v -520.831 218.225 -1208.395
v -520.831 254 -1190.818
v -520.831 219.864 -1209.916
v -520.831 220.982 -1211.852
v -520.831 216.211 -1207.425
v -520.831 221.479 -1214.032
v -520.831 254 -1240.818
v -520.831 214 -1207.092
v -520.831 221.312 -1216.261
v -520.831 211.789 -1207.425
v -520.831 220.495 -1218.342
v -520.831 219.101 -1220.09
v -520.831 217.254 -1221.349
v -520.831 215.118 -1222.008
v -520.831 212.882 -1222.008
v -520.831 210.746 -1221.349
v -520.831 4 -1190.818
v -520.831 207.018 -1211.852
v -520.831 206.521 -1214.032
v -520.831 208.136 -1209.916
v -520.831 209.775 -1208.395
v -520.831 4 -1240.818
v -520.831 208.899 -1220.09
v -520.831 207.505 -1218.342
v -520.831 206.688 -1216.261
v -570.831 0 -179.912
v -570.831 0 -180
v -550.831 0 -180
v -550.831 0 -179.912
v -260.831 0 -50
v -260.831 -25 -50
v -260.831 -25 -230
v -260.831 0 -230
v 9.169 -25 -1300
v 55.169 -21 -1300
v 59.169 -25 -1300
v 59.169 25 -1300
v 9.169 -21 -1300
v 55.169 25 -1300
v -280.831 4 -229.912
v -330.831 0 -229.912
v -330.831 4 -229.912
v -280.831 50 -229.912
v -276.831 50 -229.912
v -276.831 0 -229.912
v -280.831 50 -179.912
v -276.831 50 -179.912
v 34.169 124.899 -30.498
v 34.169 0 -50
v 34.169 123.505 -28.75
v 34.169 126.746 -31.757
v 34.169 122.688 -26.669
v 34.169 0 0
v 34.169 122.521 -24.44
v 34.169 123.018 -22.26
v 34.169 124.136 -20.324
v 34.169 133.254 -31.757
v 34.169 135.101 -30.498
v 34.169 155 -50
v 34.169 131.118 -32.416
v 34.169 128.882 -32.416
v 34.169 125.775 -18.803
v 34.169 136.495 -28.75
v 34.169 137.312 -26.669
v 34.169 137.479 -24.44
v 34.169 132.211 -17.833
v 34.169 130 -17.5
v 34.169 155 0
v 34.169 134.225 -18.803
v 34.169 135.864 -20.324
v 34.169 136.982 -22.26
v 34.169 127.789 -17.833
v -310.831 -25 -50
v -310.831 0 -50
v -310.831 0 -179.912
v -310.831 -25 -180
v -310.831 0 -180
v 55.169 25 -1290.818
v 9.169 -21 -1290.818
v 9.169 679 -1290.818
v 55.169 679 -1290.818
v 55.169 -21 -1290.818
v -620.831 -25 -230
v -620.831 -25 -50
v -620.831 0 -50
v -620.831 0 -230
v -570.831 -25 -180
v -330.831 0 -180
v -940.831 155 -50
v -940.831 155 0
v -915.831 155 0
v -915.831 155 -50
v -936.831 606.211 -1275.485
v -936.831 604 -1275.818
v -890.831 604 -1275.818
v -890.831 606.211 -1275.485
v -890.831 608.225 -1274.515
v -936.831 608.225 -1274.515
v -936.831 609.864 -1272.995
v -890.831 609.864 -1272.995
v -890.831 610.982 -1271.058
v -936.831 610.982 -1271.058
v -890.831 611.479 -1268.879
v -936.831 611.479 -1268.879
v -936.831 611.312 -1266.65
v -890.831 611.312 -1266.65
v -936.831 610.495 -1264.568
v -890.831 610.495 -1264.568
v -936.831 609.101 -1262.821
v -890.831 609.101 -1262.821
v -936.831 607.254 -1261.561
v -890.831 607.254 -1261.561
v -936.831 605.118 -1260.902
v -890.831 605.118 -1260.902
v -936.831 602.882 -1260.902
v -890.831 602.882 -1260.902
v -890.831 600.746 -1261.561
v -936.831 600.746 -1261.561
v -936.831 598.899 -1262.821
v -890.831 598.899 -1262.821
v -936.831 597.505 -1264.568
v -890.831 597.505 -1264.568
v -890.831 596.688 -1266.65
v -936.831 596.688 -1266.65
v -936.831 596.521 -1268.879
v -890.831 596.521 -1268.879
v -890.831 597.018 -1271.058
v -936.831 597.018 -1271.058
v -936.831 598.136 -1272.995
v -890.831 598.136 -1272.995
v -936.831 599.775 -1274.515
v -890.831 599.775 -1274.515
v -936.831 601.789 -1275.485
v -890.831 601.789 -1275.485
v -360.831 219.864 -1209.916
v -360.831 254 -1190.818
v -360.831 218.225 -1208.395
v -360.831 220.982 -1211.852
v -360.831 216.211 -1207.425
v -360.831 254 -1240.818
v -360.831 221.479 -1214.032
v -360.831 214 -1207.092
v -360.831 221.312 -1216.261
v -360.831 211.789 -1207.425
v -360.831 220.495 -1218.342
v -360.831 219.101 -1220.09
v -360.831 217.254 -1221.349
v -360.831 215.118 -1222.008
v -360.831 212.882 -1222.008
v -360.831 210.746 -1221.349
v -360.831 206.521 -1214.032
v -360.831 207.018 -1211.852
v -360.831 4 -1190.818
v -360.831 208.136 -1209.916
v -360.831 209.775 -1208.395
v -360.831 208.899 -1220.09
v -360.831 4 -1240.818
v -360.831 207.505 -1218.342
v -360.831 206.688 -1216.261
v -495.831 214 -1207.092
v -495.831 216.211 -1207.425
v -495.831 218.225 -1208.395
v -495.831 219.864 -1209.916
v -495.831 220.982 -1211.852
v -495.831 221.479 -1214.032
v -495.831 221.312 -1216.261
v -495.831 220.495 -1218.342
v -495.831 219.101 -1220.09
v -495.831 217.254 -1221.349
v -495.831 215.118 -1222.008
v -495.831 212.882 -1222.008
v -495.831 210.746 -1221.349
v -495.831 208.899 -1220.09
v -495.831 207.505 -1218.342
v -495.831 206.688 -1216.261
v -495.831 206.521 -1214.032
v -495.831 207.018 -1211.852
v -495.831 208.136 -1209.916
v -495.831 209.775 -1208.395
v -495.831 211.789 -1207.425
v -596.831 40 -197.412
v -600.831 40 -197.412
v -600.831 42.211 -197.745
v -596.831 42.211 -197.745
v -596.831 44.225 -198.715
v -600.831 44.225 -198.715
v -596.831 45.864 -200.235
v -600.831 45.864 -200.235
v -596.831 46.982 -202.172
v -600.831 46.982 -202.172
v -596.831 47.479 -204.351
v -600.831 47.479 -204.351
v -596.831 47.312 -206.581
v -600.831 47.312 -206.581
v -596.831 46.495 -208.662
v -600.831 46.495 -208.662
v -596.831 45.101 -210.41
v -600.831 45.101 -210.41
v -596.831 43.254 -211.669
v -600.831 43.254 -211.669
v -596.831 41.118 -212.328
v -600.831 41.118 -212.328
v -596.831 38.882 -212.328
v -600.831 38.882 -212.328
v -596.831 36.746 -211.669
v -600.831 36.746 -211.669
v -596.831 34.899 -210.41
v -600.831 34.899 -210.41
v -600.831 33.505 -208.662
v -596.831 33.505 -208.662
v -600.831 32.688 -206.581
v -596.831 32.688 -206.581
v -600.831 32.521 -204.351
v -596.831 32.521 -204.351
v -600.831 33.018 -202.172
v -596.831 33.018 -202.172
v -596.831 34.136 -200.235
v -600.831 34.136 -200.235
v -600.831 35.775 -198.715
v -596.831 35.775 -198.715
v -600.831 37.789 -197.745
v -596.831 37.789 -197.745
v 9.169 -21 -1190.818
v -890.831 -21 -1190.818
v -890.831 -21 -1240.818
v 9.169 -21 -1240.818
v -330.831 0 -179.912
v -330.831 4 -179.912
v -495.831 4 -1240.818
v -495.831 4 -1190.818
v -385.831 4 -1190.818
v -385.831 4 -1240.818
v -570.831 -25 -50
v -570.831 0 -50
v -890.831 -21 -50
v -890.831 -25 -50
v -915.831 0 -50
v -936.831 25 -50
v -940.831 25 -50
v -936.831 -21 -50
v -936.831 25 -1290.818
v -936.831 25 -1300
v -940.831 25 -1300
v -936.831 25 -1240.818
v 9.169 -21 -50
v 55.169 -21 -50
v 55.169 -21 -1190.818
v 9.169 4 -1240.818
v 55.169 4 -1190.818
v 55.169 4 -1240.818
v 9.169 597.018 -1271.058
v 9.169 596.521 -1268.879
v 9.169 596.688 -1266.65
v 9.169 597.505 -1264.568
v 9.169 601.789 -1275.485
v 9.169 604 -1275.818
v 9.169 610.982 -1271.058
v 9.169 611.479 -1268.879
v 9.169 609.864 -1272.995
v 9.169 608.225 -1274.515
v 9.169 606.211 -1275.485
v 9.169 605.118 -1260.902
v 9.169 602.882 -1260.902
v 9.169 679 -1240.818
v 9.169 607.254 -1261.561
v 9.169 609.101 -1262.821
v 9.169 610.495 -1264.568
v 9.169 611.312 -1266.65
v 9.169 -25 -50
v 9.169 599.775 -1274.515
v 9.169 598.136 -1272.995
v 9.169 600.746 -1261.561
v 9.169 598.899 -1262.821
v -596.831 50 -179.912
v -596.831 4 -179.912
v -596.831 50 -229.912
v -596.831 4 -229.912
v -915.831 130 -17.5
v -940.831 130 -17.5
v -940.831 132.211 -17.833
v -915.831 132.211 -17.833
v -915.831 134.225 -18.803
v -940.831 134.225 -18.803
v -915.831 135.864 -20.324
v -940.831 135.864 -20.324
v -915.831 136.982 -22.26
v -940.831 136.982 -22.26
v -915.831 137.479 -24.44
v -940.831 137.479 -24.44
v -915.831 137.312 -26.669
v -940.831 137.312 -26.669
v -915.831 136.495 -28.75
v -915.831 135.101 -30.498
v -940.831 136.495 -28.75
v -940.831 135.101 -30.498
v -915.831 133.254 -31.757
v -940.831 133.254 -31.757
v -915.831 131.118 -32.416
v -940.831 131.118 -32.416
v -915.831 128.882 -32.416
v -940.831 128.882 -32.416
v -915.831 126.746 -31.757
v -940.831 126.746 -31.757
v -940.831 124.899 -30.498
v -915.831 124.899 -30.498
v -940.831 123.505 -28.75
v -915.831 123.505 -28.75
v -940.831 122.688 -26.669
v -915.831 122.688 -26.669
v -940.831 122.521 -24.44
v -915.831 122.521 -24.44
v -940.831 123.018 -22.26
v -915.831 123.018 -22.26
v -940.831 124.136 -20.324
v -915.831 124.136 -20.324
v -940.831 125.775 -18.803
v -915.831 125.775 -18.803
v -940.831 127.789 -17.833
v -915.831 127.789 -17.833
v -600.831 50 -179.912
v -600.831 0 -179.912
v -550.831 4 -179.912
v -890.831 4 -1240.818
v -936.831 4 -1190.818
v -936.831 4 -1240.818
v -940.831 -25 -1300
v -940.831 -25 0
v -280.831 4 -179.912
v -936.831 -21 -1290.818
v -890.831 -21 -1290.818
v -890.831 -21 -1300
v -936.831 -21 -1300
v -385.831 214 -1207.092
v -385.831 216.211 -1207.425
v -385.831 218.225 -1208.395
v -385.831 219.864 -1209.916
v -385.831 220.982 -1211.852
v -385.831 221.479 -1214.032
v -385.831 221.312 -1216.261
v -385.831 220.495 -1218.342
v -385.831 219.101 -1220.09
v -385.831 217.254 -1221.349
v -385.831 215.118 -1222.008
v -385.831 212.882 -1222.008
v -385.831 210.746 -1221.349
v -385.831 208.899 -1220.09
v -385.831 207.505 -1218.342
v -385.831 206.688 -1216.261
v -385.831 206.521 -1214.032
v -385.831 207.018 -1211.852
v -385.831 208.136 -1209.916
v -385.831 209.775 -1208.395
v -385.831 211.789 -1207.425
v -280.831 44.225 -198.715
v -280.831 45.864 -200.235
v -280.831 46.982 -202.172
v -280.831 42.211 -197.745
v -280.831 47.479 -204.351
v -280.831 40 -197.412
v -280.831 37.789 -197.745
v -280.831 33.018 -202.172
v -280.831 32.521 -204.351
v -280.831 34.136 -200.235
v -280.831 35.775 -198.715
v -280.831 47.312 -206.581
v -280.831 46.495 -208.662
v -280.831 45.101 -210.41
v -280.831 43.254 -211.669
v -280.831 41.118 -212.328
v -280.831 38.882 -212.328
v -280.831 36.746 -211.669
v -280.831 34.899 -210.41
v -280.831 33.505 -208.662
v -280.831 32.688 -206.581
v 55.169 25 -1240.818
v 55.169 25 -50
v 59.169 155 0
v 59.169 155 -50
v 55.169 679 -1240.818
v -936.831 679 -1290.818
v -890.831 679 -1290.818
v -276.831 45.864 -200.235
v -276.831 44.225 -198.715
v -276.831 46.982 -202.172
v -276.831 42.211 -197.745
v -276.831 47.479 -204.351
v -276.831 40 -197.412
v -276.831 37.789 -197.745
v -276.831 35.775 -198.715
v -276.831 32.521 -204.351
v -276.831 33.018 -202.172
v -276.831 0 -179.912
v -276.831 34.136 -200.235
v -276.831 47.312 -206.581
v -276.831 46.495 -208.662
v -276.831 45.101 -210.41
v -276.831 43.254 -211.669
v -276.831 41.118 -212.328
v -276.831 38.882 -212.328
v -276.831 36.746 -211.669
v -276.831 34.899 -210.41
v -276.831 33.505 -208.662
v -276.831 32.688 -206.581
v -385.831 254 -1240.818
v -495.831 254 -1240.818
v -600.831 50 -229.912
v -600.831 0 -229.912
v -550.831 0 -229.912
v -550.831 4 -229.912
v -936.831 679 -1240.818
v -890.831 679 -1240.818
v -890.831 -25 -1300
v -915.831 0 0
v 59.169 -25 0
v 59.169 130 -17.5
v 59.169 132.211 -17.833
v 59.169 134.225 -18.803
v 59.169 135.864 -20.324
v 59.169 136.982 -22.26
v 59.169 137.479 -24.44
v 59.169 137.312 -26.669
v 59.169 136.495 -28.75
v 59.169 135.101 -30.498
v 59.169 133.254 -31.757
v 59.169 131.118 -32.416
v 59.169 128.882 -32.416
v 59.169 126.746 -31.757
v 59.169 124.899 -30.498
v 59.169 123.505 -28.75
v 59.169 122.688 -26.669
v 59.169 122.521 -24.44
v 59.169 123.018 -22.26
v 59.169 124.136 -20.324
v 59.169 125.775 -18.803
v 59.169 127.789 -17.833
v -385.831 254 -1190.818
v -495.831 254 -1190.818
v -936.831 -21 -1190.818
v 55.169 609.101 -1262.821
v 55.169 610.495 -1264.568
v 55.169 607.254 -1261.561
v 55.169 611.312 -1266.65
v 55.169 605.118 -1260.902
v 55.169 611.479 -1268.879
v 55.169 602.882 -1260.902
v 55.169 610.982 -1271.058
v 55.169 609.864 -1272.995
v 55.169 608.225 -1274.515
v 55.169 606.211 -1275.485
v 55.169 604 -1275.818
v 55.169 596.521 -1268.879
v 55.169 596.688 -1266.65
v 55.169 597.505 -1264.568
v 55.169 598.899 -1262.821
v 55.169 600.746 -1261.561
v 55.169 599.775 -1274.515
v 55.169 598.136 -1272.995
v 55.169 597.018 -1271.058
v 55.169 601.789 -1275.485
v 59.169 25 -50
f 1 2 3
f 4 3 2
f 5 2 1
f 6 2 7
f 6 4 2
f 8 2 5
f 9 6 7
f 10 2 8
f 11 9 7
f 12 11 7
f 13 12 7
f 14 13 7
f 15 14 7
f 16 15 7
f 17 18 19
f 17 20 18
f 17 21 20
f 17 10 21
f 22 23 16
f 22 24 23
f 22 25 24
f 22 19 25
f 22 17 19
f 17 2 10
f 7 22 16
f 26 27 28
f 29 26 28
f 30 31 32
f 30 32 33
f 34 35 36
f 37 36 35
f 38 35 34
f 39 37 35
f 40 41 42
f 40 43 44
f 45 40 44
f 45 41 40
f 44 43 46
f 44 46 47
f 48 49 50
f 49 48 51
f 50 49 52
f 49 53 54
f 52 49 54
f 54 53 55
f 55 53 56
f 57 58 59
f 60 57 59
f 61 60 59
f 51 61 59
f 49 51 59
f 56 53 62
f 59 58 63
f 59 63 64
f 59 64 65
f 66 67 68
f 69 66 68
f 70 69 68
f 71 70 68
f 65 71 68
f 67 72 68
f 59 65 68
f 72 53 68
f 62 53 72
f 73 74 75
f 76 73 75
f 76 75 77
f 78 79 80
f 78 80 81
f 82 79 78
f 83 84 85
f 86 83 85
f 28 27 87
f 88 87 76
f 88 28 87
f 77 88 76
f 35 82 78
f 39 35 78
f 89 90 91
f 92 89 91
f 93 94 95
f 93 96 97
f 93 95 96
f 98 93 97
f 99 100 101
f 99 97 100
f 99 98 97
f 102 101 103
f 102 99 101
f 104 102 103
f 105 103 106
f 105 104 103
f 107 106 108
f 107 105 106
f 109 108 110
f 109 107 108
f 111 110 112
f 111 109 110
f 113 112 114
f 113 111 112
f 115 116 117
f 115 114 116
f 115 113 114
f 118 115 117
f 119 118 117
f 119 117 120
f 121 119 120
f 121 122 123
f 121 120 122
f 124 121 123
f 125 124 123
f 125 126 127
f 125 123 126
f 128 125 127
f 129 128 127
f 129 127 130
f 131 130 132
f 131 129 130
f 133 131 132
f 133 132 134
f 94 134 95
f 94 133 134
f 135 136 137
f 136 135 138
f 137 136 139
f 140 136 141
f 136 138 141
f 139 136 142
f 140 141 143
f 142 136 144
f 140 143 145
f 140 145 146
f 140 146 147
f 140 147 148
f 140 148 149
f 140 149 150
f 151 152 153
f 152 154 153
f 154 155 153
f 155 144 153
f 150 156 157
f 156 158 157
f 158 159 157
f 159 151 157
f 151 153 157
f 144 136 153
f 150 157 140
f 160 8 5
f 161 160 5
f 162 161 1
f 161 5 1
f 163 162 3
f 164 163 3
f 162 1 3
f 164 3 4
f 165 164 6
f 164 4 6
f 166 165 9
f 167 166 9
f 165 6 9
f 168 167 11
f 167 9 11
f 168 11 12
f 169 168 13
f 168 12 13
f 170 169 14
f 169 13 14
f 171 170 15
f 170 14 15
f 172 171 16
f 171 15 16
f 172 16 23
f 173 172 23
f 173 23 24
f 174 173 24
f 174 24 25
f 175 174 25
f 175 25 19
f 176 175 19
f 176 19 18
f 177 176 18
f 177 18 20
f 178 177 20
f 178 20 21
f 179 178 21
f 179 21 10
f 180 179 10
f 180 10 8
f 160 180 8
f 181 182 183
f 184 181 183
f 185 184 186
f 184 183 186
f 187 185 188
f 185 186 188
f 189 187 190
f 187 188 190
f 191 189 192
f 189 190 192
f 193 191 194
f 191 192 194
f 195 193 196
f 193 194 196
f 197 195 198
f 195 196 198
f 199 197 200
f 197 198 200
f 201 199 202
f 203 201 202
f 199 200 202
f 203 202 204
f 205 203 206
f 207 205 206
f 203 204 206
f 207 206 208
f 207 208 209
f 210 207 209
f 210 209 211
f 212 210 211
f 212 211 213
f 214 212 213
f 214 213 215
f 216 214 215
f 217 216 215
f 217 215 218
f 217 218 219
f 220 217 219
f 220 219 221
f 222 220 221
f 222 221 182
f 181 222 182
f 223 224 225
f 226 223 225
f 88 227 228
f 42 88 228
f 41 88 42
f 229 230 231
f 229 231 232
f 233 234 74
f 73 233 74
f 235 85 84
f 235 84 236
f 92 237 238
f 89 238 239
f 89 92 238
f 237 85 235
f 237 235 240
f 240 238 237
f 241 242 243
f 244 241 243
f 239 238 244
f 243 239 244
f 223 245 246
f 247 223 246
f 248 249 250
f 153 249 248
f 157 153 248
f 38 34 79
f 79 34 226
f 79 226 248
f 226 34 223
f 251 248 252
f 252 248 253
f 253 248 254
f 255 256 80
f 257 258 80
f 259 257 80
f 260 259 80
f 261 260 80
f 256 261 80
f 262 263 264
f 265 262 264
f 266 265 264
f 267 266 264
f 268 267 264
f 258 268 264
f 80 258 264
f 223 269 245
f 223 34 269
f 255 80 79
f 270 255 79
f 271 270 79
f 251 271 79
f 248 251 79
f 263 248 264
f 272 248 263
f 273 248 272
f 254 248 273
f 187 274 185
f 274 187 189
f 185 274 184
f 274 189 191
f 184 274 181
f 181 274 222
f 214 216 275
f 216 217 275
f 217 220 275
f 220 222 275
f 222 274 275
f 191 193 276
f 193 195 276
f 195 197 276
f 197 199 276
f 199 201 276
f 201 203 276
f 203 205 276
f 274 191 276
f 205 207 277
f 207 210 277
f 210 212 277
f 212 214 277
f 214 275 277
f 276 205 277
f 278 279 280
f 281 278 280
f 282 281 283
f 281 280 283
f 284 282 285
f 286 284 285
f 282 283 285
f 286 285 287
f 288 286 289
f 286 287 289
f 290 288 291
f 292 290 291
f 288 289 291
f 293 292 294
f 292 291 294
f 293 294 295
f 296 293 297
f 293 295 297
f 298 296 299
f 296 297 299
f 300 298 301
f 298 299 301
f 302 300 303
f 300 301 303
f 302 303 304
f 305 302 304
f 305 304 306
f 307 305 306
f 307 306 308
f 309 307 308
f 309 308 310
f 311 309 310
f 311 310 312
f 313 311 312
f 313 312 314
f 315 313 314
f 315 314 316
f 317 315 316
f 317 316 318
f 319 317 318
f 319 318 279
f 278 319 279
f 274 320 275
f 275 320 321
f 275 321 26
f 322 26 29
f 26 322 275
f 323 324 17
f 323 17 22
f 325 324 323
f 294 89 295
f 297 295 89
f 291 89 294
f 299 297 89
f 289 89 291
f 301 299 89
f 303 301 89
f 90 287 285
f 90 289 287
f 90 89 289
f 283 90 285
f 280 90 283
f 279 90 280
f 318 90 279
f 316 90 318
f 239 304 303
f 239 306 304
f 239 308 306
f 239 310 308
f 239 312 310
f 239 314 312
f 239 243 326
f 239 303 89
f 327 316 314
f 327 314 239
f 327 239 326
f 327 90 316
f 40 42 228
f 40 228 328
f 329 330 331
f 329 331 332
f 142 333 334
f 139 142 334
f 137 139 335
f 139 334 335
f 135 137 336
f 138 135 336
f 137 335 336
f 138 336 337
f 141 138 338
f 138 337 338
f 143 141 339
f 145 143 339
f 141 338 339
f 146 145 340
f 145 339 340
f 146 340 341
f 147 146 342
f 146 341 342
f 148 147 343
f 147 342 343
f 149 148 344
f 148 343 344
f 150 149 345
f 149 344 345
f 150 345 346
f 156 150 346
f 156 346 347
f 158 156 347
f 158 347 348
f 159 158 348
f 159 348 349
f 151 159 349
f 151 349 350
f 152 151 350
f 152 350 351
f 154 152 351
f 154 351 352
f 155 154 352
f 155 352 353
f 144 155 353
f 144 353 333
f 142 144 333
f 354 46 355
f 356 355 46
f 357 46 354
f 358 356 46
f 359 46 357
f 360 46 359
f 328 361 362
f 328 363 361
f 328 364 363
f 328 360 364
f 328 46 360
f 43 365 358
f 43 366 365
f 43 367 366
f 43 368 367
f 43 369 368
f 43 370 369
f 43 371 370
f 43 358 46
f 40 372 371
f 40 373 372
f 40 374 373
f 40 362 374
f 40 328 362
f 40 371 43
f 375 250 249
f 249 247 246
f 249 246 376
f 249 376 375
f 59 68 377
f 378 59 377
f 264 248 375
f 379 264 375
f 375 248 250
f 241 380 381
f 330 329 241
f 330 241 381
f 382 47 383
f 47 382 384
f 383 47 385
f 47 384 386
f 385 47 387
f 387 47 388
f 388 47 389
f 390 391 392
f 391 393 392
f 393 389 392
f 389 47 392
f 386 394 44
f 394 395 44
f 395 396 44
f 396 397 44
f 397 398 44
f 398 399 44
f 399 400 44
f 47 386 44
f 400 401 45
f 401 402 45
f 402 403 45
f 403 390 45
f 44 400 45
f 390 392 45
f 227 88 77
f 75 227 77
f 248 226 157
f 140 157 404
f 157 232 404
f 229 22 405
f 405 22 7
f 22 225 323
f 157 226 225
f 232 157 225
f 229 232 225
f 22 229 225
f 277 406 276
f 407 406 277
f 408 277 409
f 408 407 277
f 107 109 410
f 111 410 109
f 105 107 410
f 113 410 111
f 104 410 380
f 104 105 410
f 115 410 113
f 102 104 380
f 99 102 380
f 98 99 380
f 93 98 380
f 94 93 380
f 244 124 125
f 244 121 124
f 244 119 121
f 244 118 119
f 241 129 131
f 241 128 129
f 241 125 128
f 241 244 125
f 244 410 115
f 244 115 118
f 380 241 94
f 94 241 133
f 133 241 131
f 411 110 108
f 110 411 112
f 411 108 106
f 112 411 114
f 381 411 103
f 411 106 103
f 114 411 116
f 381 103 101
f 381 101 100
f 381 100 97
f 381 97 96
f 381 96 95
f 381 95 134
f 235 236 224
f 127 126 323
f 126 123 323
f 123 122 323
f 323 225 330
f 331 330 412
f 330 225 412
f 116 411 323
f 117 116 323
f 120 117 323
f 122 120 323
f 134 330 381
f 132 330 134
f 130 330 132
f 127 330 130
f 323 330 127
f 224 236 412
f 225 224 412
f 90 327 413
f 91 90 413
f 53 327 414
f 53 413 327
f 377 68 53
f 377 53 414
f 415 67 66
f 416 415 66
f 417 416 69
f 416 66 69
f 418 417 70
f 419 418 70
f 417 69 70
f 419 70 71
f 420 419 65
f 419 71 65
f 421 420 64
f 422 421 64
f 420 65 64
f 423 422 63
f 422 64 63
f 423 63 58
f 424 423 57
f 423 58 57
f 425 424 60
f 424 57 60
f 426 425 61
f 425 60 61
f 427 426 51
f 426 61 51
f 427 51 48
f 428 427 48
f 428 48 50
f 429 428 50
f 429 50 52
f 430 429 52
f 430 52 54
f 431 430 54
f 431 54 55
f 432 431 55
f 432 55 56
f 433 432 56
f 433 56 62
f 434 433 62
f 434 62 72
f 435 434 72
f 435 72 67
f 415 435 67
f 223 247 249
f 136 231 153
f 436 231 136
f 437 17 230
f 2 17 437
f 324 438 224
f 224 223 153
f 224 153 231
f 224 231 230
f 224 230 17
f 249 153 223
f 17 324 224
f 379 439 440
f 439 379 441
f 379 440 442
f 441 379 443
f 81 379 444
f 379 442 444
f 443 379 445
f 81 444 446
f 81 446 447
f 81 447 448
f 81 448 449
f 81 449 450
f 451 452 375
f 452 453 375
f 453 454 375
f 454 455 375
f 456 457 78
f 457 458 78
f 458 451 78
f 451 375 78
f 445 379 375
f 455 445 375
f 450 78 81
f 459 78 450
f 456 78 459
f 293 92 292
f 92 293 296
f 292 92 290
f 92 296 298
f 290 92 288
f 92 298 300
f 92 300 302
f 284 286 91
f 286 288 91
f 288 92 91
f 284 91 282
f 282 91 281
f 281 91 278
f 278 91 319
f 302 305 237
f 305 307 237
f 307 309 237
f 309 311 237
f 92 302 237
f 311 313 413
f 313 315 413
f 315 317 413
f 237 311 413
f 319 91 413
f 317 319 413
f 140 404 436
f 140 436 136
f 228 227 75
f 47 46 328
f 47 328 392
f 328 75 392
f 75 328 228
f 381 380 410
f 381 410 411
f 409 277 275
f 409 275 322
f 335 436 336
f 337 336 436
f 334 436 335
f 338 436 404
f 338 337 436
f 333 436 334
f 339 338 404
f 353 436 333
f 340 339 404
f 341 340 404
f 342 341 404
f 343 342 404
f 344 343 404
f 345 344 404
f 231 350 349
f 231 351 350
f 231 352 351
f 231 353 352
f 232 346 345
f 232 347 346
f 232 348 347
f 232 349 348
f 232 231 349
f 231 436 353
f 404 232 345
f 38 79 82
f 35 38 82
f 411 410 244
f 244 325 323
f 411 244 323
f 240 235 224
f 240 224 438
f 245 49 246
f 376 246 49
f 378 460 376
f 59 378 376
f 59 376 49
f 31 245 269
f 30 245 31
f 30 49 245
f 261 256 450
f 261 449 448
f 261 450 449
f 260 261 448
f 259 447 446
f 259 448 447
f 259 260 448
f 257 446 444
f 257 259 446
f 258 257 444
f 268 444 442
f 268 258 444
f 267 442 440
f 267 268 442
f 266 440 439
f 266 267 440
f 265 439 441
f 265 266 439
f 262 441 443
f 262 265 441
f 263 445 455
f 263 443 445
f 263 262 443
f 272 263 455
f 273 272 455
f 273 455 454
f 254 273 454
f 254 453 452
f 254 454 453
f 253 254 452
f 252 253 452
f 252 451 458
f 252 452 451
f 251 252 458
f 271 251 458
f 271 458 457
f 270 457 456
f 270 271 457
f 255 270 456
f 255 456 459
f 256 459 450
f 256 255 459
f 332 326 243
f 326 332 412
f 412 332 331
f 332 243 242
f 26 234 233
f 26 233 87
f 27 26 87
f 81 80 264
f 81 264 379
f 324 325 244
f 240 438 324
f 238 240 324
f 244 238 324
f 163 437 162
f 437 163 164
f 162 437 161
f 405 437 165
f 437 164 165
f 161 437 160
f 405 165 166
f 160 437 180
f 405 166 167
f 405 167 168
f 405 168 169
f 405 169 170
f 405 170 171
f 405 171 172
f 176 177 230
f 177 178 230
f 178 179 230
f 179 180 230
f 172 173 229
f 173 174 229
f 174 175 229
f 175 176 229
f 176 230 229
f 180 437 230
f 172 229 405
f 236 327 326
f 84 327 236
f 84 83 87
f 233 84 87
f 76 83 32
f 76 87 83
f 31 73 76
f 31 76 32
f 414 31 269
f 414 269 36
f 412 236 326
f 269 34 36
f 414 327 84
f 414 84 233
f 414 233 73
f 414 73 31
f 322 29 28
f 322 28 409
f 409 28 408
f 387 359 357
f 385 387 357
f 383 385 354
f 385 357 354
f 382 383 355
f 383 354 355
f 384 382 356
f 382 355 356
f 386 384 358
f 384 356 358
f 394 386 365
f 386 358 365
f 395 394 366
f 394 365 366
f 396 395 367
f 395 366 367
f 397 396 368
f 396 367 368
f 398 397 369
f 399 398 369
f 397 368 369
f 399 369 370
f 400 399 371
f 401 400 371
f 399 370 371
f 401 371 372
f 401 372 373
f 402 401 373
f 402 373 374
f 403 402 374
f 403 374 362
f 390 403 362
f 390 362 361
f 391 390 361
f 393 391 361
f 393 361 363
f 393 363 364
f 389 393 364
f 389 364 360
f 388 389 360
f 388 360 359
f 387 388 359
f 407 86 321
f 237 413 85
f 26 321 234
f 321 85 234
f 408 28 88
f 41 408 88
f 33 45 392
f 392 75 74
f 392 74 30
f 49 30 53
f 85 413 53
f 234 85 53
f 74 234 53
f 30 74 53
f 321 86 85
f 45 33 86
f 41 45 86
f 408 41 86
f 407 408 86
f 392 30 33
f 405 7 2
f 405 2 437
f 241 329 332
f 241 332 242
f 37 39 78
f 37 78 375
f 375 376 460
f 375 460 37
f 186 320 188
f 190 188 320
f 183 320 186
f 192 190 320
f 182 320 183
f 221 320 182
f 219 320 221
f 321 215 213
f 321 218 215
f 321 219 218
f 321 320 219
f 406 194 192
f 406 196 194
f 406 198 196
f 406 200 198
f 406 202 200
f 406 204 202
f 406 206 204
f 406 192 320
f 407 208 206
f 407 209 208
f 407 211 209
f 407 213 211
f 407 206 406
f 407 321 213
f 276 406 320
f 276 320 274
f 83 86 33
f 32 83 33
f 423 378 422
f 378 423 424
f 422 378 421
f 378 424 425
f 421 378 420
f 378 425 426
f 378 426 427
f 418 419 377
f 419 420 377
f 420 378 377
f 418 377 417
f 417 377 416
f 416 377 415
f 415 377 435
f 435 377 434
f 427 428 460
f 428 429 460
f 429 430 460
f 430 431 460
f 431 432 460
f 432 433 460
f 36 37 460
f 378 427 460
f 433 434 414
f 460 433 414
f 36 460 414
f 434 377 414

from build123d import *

# Parameters (mm, degrees)
BOSS_EXTRUDE1_DEPTH     = 50
SKETCH2_W               = 360
SKETCH2_H               = 25
BOSS_EXTRUDE3_DEPTH     = 230
SKETCH3_W               = 260
SKETCH3_H               = 130
CUT_EXTRUDE1_DEPTH      = 230
BOSS_EXTRUDE4_DEPTH     = 1250
BOSS_EXTRUDE5_DEPTH     = 1250
SKETCH7_W               = 46
SKETCH7_H               = 50
BOSS_EXTRUDE6_DEPTH     = 700
SKETCH10_W              = 50
SKETCH10_H              = 25
BOSS_EXTRUDE7_DEPTH     = 992
SKETCH11_R              = 7.5
CUT_EXTRUDE2_DEPTH      = 1012
SKETCH12_W              = 50
SKETCH12_H              = 50
BOSS_EXTRUDE8_DEPTH     = 4
SKETCH13_W              = 4
SKETCH13_H              = 50
BOSS_EXTRUDE9_DEPTH     = 50
SKETCH15_R              = 7.5
CUT_EXTRUDE3_DEPTH      = 380
CUT_EXTRUDE5_DEPTH      = 1743.470523401
CUT_EXTRUDE5_DEPTH_BACK = 1743.470523401
SKETCH16_R              = 7.5
SKETCH17_W              = 25
SKETCH17_H              = 50
BOSS_EXTRUDE10_DEPTH    = 250
SKETCH18_R              = 7.5
CUT_EXTRUDE6_DEPTH      = 250


with BuildPart() as part:
    # Sketch1 → Boss-Extrude1 (new body)
    with BuildSketch(Plane.XY):
        Polygon((-915.830763168, 0), (34.169236832, 0), (34.169236832, 155), (59.169236832, 155), (59.169236832, -25), (-940.830763168, -25), (-940.830763168, 155), (-915.830763168, 155), align=None)
    extrude(amount=-BOSS_EXTRUDE1_DEPTH)

    # Sketch2 → Boss-Extrude3 (add)
    with BuildSketch(Plane.XY):
        with Locations((-440.830763168, -12.5)):
            Rectangle(SKETCH2_W, SKETCH2_H)
    extrude(amount=-BOSS_EXTRUDE3_DEPTH)

    # Sketch3 → Cut-Extrude1 (cut)
    with BuildSketch(Plane(origin=(0, 0, 0), x_dir=(1, 0, 0), z_dir=(0, 1, 0))):
        with Locations((-440.830763168, 115)):
            Rectangle(SKETCH3_W, SKETCH3_H)
    extrude(amount=-CUT_EXTRUDE1_DEPTH, mode=Mode.SUBTRACT)

    # Sketch4 → Boss-Extrude4 (add)
    with BuildSketch(Plane(origin=(0, 0, -50), x_dir=(-1, 0, 0), z_dir=(0, 0, -1))):
        Polygon((-59.169236832, 25), (-59.169236832, -25), (-9.169236832, -25), (-9.169236832, -21), (-55.169236832, -21), (-55.169236832, 25), align=None)
    extrude(amount=BOSS_EXTRUDE4_DEPTH)

    # Sketch6 → Boss-Extrude5 (add)
    with BuildSketch(Plane(origin=(0, 0, -50), x_dir=(-1, 0, 0), z_dir=(0, 0, -1))):
        Polygon((940.830763168, 25), (940.830763168, -25), (890.830763168, -25), (890.830763168, -21), (936.830763168, -21), (936.830763168, 25), align=None)
    extrude(amount=BOSS_EXTRUDE5_DEPTH)

    # Sketch7 → Boss-Extrude6 (add)
    with BuildSketch(Plane(origin=(0, -21, 0), x_dir=(1, 0, 0), z_dir=(0, 1, 0))):
        with Locations((-913.830763168, 1265.818413322)):
            Rectangle(SKETCH7_W, SKETCH7_H)
        with Locations((32.169236832, 1265.818413322)):
            Rectangle(SKETCH7_W, SKETCH7_H)
    extrude(amount=BOSS_EXTRUDE6_DEPTH)

    # Sketch10 → Boss-Extrude7 (add)
    with BuildSketch(Plane(origin=(-936.830763168, 0, 0), x_dir=(0, 0, -1), z_dir=(1, 0, 0))):
        with Locations((1215.818413322, -8.5)):
            Rectangle(SKETCH10_W, SKETCH10_H)
    extrude(amount=BOSS_EXTRUDE7_DEPTH)

    # Sketch11 → Cut-Extrude2 (cut)
    with BuildSketch(Plane.ZY.offset(940.830763168)):
        with Locations((-25, 130)):
            Circle(SKETCH11_R)
    extrude(amount=-CUT_EXTRUDE2_DEPTH, mode=Mode.SUBTRACT)

    # Sketch12 → Boss-Extrude8 (add)
    with BuildSketch(Plane(origin=(0, 0, 0), x_dir=(1, 0, 0), z_dir=(0, 1, 0))):
        with Locations((-575.830763168, 204.911627509)):
            Rectangle(SKETCH12_W, SKETCH12_H)
        with Locations((-305.830763168, 204.911627509)):
            Rectangle(SKETCH12_W, SKETCH12_H)
    extrude(amount=BOSS_EXTRUDE8_DEPTH)

    # Sketch13 → Boss-Extrude9 (add)
    with BuildSketch(Plane(origin=(0, 0, 0), x_dir=(1, 0, 0), z_dir=(0, 1, 0))):
        with Locations((-598.830763168, 204.911627509)):
            Rectangle(SKETCH13_W, SKETCH13_H)
        with Locations((-278.830763168, 204.911627509)):
            Rectangle(SKETCH13_W, SKETCH13_H)
    extrude(amount=BOSS_EXTRUDE9_DEPTH)

    # Sketch15 → Cut-Extrude3 (cut)
    with BuildSketch(Plane.ZY.offset(600.830763168)):
        with Locations((-204.911627509, 40)):
            Circle(SKETCH15_R)
    extrude(amount=-CUT_EXTRUDE3_DEPTH, mode=Mode.SUBTRACT)

    # Sketch16 → Cut-Extrude5 (cut, two sides: drawn at the far end of the back side and taken through both)
    with BuildSketch(Plane(origin=(0, 0, 0), x_dir=(0, 0, -1), z_dir=(1, 0, 0)).offset(-CUT_EXTRUDE5_DEPTH_BACK)):
        with Locations((1268.318413322, 604)):
            Circle(SKETCH16_R)
    extrude(amount=CUT_EXTRUDE5_DEPTH + CUT_EXTRUDE5_DEPTH_BACK, mode=Mode.SUBTRACT)

    # Sketch17 → Boss-Extrude10 (add)
    with BuildSketch(Plane(origin=(0, 4, 0), x_dir=(1, 0, 0), z_dir=(0, 1, 0))):
        with Locations((-508.330763168, 1215.818413322)):
            Rectangle(SKETCH17_W, SKETCH17_H)
        with Locations((-373.330763168, 1215.818413322)):
            Rectangle(SKETCH17_W, SKETCH17_H)
    extrude(amount=BOSS_EXTRUDE10_DEPTH)

    # Sketch18 → Cut-Extrude6 (cut)
    with BuildSketch(Plane.ZY.offset(520.830763168)):
        with Locations((-1214.592207536, 214)):
            Circle(SKETCH18_R)
    extrude(amount=-CUT_EXTRUDE6_DEPTH, mode=Mode.SUBTRACT)


solid = part.part
